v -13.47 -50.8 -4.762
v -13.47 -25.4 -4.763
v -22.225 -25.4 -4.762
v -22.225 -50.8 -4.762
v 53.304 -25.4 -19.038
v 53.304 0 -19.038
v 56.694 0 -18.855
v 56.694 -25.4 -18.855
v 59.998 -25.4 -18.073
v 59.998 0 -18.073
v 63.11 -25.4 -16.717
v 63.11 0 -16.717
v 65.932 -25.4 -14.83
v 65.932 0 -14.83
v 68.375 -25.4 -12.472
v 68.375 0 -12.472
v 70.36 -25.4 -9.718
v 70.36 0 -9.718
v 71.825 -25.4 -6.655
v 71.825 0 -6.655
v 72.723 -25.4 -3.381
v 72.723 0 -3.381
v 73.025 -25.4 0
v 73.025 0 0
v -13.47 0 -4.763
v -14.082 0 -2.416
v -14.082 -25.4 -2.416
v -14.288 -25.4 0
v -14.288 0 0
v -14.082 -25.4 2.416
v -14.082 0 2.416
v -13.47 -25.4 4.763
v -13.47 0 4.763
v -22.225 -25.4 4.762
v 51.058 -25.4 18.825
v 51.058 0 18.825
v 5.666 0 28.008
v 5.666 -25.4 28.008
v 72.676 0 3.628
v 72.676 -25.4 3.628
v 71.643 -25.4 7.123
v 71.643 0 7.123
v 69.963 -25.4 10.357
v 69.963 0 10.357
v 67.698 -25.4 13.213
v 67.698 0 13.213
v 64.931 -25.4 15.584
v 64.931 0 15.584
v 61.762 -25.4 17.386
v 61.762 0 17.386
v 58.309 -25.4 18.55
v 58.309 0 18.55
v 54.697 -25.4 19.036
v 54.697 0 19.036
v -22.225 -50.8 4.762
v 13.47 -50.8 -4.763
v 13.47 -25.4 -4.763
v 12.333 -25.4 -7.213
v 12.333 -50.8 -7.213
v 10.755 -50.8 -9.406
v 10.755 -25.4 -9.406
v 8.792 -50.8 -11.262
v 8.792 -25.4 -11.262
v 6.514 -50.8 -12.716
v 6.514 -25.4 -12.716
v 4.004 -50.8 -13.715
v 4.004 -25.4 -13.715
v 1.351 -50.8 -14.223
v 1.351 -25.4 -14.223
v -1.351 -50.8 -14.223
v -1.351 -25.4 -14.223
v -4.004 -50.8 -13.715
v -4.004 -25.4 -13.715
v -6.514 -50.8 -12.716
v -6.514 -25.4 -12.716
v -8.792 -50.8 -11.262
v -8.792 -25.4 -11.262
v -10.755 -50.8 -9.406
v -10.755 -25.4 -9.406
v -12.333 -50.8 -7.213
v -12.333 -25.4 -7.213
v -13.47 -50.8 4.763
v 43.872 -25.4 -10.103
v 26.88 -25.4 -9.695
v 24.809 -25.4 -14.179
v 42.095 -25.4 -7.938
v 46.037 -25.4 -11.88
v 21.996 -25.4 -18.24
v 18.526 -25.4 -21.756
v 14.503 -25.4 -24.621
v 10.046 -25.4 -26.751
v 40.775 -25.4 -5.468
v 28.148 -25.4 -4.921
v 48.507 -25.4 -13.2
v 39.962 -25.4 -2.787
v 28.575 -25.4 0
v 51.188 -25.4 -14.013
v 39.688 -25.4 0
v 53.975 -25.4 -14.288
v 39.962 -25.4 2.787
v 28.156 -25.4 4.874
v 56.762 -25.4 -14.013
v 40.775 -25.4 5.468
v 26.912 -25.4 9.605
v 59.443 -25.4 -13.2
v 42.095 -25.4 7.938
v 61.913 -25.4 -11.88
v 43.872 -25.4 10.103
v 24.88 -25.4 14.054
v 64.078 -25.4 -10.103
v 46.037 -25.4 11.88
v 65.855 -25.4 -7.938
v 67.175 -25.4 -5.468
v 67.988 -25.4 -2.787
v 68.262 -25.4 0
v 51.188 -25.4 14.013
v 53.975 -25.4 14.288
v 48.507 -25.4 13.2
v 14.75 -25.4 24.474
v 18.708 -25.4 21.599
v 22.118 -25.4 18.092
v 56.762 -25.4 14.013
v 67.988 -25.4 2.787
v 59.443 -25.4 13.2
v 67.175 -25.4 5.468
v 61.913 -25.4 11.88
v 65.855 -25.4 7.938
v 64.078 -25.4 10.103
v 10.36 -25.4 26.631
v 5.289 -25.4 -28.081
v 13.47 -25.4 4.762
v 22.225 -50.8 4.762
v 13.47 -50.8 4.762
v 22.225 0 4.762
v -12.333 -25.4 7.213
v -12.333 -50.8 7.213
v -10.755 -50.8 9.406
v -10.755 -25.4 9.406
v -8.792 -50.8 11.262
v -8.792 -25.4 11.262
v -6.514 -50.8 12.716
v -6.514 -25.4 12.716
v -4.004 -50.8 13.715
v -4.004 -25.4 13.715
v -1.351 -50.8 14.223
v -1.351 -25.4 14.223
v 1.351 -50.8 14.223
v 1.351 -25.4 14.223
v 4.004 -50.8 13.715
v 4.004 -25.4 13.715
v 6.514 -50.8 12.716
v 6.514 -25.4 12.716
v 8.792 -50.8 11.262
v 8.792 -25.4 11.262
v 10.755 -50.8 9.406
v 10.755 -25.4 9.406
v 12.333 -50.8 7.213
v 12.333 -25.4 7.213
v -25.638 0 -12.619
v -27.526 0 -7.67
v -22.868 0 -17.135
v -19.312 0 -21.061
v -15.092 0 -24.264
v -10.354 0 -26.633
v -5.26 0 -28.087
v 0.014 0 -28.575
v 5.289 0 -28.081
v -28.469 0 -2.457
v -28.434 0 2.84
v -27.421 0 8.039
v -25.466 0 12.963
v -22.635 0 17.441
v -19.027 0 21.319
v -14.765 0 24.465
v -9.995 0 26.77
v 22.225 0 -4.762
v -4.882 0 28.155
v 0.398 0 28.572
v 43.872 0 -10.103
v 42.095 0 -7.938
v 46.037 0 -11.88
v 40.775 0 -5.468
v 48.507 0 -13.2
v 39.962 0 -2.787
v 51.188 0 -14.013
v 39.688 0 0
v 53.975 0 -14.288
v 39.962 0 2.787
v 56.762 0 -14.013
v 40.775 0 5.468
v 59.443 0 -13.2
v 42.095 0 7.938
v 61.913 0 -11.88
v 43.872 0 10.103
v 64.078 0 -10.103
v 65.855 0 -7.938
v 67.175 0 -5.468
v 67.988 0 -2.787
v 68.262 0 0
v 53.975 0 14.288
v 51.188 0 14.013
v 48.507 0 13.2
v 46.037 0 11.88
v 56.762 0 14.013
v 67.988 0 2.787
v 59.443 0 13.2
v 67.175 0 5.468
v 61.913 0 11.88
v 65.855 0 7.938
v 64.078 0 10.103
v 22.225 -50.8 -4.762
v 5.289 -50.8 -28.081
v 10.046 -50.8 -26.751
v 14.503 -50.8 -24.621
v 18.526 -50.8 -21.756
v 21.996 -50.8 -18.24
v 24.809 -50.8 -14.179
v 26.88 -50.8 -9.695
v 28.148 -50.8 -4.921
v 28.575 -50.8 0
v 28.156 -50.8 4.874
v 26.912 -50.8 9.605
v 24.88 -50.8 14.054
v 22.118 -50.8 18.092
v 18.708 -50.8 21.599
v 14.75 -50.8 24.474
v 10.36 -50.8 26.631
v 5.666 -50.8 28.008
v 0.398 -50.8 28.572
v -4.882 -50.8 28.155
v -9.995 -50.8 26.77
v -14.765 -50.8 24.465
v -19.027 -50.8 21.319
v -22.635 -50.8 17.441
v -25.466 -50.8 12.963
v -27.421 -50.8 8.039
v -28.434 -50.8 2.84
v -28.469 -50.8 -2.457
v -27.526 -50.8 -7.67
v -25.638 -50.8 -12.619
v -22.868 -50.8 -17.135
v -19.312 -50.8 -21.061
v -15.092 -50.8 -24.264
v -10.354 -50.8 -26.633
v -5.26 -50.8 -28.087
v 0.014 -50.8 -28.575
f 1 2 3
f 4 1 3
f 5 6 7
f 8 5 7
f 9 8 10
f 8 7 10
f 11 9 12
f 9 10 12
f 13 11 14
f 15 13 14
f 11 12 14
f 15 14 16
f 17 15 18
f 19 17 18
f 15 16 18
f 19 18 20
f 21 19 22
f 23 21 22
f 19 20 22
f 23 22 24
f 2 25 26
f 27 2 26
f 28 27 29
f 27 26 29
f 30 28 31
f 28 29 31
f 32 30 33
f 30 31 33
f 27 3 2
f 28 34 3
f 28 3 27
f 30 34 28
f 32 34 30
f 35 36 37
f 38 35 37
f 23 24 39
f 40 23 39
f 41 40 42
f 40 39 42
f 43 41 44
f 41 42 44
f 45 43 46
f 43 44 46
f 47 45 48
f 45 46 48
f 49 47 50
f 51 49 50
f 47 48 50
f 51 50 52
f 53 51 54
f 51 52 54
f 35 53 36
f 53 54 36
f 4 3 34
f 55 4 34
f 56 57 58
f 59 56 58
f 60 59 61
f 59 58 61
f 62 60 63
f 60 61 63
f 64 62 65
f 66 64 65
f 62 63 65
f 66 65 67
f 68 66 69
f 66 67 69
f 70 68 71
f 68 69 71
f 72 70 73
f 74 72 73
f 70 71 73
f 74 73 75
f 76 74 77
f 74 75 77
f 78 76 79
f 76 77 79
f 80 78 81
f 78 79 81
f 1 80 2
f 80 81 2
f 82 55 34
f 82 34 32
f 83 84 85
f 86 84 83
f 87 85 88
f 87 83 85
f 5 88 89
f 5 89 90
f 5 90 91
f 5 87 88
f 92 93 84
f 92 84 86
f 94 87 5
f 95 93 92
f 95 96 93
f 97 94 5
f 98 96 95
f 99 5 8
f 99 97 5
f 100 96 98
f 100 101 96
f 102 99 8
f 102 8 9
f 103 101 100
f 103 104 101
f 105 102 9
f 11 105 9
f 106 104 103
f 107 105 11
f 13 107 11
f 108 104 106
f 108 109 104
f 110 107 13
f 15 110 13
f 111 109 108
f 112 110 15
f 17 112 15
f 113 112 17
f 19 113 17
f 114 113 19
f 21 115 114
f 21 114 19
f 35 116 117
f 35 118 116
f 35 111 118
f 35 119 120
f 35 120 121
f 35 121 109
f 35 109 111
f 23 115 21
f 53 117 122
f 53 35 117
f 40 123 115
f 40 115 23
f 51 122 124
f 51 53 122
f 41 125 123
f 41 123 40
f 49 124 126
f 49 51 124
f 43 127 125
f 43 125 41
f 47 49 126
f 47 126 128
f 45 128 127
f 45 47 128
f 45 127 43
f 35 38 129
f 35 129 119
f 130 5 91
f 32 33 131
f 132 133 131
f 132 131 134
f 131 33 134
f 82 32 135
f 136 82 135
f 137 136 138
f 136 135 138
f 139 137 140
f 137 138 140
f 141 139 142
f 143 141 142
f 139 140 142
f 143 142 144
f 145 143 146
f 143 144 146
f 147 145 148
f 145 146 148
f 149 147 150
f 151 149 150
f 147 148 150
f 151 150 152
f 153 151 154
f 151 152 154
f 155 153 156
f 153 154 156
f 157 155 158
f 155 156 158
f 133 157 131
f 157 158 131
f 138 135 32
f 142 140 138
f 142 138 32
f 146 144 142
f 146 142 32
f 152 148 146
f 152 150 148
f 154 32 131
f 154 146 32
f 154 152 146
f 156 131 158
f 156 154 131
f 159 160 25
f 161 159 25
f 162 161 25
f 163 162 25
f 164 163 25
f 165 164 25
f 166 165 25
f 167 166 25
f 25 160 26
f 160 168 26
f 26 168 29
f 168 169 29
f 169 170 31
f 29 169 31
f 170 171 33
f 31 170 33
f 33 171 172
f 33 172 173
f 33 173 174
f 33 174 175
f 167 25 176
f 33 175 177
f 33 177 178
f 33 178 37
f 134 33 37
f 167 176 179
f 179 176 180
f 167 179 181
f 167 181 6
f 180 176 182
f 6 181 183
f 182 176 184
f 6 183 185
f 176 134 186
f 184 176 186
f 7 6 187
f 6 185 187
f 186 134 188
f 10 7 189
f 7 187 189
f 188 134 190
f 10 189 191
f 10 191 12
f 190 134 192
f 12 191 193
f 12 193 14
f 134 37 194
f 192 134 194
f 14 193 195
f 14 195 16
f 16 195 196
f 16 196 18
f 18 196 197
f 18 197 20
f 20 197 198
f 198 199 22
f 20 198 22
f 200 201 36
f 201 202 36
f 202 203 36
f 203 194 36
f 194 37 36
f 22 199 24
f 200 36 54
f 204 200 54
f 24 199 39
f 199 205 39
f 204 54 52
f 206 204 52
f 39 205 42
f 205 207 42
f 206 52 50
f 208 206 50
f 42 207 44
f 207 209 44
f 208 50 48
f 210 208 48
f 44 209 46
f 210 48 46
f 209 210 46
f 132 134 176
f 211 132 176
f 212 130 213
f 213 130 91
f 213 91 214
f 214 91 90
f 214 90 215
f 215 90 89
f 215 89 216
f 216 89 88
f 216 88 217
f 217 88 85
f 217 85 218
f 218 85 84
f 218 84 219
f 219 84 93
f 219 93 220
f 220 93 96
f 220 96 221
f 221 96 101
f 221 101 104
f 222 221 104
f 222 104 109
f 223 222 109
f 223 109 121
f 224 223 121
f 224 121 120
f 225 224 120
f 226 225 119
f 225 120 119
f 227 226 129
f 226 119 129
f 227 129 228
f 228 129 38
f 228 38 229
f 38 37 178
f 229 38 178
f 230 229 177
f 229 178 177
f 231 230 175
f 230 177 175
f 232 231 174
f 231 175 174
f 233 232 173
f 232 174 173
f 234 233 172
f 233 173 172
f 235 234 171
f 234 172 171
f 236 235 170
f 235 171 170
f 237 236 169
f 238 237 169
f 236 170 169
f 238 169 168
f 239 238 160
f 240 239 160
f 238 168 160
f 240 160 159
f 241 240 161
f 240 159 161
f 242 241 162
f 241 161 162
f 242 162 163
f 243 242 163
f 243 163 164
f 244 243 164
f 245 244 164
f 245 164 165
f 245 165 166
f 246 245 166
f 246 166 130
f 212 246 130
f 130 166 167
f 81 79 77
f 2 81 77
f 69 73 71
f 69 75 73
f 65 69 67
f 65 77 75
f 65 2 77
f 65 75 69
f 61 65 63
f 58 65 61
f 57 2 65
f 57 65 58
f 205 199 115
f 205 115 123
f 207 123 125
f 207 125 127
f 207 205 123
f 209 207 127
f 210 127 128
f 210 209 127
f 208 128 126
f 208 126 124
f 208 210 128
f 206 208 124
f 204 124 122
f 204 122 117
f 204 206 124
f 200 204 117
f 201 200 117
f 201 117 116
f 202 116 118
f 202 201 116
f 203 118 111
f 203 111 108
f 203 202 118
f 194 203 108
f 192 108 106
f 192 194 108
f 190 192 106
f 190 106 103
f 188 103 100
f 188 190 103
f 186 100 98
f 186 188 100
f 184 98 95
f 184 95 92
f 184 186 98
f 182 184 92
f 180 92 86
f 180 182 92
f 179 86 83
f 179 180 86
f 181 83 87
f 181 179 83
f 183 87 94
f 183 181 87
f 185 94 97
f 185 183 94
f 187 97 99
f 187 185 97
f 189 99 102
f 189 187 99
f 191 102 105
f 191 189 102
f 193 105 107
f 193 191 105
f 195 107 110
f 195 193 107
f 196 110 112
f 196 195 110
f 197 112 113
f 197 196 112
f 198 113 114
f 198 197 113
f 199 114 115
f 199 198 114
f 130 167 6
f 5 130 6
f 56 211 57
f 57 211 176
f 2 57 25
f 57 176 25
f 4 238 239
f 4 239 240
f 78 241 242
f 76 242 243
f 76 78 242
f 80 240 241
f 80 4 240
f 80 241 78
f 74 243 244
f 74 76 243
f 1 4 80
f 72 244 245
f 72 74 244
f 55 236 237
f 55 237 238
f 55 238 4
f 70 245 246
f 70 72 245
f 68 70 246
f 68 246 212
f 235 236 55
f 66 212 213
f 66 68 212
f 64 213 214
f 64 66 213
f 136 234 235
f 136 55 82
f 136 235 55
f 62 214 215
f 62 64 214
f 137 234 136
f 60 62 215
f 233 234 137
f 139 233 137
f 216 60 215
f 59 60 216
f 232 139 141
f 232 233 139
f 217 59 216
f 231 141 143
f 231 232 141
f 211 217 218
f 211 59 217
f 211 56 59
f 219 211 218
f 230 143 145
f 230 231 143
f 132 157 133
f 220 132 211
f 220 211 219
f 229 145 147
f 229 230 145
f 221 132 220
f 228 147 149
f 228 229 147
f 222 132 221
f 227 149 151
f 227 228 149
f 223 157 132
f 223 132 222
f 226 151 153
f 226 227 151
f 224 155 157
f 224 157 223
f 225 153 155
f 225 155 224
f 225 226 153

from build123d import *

# Parameters (mm, degrees)
F0_R     = 14.2875
F1_DEPTH = 25.4
F2_DEPTH = 25.4
F3_DEPTH = 50.8


with BuildPart() as f1:
    # F0 (on Front) → F1 (new body)
    with BuildSketch(Plane.XZ):
        with BuildLine():
            ThreePointArc((5.2887591577, -28.0813043068), (21.9961009946, -18.240125165), (28.575, 0))
            ThreePointArc((28.575, 0), (22.118144808, 18.0919400633), (5.6655830094, 28.0077095487))
            ThreePointArc((5.6655830094, 28.0077095487), (-28.5743551441, 0.1919716148), (5.2887591577, -28.0813043068))
        make_face()
        with BuildLine():
            ThreePointArc((-13.4703841816, 4.7625), (0, 14.2875), (13.4703841816, 4.7625))
            Line((13.4703841816, 4.7625), (22.225, 4.7625))
            Line((22.225, 4.7625), (22.225, -4.7625))
            Line((22.225, -4.7625), (13.4703841816, -4.7625))
            ThreePointArc((13.4703841816, -4.7625), (0, -14.2875), (-13.4703841816, -4.7625))
            Line((-13.4703841816, -4.7625), (-22.225, -4.7625))
            Line((-22.225, -4.7625), (-22.225, 4.7625))
            Line((-22.225, 4.7625), (-13.4703841816, 4.7625))
        make_face(mode=Mode.SUBTRACT)
        with BuildLine():
            ThreePointArc((73.025, 0), (66.3713381906, 14.464898875), (51.0582494002, 18.8253835536))
            ThreePointArc((51.0582494002, 18.8253835536), (34.9584276531, -1.1280408576), (53.304272269, -19.0381885775))
            ThreePointArc((53.304272269, -19.0381885775), (67.2061212058, -13.7054708652), (73.025, 0))
        make_face()
        with Locations((53.975, 0)):
            Circle(F0_R, mode=Mode.SUBTRACT)
        with BuildLine():
            ThreePointArc((5.6655830094, 28.0077095487), (22.118144808, 18.0919400633), (28.575, 0))
            ThreePointArc((28.575, 0), (21.9961009946, -18.240125165), (5.2887591577, -28.0813043068))
            Line((5.2887591577, -28.0813043068), (53.304272269, -19.0381885775))
            ThreePointArc((53.304272269, -19.0381885775), (34.9584276531, -1.1280408576), (51.0582494002, 18.8253835536))
            Line((51.0582494002, 18.8253835536), (5.6655830094, 28.0077095487))
        make_face()
        with BuildLine():
            ThreePointArc((-13.4703841816, -4.7625), (-14.2875, 0), (-13.4703841816, 4.7625))
            Line((-13.4703841816, 4.7625), (-22.225, 4.7625))
            Line((-22.225, 4.7625), (-22.225, -4.7625))
            Line((-22.225, -4.7625), (-13.4703841816, -4.7625))
        make_face()
    extrude(amount=F1_DEPTH)

    # F0 (on Front) → F2 (join)
    with BuildSketch(Plane.XZ):
        with BuildLine():
            ThreePointArc((5.6655830094, 28.0077095487), (22.118144808, 18.0919400633), (28.575, 0))
            ThreePointArc((28.575, 0), (21.9961009946, -18.240125165), (5.2887591577, -28.0813043068))
            Line((5.2887591577, -28.0813043068), (53.304272269, -19.0381885775))
            ThreePointArc((53.304272269, -19.0381885775), (34.9584276531, -1.1280408576), (51.0582494002, 18.8253835536))
            Line((51.0582494002, 18.8253835536), (5.6655830094, 28.0077095487))
        make_face()
        with BuildLine():
            Line((-13.4703841816, 4.7625), (13.4703841816, 4.7625))
            ThreePointArc((13.4703841816, 4.7625), (0, 14.2875), (-13.4703841816, 4.7625))
        make_face()
        with BuildLine():
            ThreePointArc((-13.4703841816, -4.7625), (0, -14.2875), (13.4703841816, -4.7625))
            Line((13.4703841816, -4.7625), (-13.4703841816, -4.7625))
        make_face()
    extrude(amount=F2_DEPTH)

    # F0 (on Front) → F3 (join)
    with BuildSketch(Plane.XZ):
        with BuildLine():
            ThreePointArc((5.2887591577, -28.0813043068), (21.9961009946, -18.240125165), (28.575, 0))
            ThreePointArc((28.575, 0), (22.118144808, 18.0919400633), (5.6655830094, 28.0077095487))
            ThreePointArc((5.6655830094, 28.0077095487), (-28.5743551441, 0.1919716148), (5.2887591577, -28.0813043068))
        make_face()
        with BuildLine():
            ThreePointArc((-13.4703841816, 4.7625), (0, 14.2875), (13.4703841816, 4.7625))
            Line((13.4703841816, 4.7625), (22.225, 4.7625))
            Line((22.225, 4.7625), (22.225, -4.7625))
            Line((22.225, -4.7625), (13.4703841816, -4.7625))
            ThreePointArc((13.4703841816, -4.7625), (0, -14.2875), (-13.4703841816, -4.7625))
            Line((-13.4703841816, -4.7625), (-22.225, -4.7625))
            Line((-22.225, -4.7625), (-22.225, 4.7625))
            Line((-22.225, 4.7625), (-13.4703841816, 4.7625))
        make_face(mode=Mode.SUBTRACT)
    extrude(amount=F3_DEPTH)


solid = f1.part
